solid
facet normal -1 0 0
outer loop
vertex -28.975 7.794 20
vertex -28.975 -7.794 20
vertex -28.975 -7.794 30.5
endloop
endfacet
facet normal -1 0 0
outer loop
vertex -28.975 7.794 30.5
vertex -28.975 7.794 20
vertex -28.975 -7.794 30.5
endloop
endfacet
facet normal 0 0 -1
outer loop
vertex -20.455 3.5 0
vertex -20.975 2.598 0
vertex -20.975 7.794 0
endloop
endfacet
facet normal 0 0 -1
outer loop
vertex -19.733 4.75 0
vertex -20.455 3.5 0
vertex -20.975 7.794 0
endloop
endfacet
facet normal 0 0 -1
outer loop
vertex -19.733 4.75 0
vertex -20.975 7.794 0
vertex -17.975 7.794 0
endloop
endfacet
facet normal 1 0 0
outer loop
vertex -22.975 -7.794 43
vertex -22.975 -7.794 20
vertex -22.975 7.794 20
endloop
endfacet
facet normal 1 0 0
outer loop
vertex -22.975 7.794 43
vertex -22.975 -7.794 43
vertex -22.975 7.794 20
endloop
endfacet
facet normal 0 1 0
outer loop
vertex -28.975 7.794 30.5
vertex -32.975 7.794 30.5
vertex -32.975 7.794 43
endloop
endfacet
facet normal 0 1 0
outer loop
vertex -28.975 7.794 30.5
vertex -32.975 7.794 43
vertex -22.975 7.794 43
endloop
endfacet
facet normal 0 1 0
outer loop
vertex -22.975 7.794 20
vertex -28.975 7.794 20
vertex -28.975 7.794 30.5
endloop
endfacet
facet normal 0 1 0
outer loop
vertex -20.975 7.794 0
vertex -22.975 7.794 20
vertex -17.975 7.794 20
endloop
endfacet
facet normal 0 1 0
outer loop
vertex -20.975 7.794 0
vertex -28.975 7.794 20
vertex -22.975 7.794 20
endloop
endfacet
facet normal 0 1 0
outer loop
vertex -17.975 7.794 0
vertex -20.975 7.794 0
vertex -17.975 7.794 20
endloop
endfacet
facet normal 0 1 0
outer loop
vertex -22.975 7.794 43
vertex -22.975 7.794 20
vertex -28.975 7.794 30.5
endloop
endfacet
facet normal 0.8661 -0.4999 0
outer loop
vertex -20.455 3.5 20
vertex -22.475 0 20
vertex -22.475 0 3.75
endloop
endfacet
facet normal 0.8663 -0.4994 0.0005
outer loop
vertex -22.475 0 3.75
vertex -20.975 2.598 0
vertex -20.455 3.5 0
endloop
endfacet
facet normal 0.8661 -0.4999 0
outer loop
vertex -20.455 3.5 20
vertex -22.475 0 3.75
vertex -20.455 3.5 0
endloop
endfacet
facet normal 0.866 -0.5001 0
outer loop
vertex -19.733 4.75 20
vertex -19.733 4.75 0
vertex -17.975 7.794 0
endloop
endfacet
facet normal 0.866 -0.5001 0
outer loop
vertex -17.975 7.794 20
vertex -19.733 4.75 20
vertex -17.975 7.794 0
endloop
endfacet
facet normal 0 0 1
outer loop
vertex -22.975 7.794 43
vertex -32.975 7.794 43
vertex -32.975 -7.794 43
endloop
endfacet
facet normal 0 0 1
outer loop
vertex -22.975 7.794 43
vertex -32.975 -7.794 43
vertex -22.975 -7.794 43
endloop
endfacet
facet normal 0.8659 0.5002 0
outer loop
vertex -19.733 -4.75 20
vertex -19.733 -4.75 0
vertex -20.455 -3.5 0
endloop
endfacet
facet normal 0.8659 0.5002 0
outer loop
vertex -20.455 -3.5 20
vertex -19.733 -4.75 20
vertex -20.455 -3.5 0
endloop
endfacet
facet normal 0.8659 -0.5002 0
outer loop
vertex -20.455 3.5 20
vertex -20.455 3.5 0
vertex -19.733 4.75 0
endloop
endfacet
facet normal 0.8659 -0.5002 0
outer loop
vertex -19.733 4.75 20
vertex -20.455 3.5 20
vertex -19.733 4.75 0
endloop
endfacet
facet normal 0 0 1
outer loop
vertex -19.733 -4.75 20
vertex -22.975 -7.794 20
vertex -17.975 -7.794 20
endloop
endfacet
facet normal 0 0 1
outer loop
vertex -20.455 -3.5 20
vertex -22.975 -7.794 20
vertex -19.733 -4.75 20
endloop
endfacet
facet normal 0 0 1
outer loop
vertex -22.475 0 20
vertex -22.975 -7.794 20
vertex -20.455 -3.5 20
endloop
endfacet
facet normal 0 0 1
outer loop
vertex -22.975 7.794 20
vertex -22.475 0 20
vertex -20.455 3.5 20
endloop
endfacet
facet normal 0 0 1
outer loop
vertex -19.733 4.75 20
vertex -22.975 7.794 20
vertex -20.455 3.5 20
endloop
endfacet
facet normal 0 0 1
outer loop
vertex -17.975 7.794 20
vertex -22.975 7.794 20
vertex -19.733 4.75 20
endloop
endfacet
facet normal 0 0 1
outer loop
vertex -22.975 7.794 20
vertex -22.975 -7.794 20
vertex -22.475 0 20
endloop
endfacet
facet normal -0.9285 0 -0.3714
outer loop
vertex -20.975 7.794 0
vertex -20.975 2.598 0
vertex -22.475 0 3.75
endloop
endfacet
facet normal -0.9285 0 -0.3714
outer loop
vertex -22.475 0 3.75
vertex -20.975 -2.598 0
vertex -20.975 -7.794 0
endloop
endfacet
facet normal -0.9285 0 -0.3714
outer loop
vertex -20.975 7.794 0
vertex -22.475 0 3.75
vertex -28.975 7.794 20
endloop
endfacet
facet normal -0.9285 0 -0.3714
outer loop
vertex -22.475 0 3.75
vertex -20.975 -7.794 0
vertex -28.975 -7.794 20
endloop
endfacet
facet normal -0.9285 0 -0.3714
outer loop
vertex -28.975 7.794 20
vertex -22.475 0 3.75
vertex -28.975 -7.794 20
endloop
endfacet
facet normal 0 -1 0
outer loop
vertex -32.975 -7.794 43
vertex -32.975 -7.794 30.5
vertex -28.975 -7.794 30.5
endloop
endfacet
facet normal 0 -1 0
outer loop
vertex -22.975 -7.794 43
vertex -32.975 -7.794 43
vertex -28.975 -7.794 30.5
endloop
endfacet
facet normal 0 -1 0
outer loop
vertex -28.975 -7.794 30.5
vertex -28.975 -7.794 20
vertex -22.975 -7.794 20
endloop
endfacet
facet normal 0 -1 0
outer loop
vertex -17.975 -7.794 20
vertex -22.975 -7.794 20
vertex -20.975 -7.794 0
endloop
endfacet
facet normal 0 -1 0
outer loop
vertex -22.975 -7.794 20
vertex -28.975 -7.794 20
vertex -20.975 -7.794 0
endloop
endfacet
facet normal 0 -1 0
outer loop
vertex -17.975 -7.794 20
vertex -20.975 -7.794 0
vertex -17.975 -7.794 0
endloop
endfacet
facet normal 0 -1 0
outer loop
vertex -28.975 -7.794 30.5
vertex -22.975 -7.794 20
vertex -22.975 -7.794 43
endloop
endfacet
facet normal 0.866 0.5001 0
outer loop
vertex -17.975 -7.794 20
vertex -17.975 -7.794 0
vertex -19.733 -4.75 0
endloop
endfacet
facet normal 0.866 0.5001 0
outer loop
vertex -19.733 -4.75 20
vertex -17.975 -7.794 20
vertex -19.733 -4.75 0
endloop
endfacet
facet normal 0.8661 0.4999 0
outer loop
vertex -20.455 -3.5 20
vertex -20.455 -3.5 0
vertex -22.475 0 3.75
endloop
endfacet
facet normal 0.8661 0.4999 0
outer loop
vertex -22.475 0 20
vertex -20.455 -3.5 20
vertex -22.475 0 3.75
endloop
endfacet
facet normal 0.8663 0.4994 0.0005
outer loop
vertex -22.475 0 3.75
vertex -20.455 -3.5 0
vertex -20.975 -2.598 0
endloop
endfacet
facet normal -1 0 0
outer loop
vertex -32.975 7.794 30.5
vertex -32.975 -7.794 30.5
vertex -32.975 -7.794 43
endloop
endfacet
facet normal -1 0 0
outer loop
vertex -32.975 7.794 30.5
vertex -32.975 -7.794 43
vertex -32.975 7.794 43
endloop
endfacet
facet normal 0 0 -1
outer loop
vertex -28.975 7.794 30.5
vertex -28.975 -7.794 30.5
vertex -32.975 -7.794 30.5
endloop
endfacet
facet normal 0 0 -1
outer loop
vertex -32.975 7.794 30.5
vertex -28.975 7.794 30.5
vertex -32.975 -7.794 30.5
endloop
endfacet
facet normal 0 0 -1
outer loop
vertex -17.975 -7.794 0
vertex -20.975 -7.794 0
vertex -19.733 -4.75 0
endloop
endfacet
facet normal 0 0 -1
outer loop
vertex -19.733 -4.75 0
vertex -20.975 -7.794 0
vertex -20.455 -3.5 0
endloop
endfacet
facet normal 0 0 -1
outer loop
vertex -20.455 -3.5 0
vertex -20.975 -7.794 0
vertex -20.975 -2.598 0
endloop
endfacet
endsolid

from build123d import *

# Parameters (mm, degrees)
F0_W     = 10
F0_H     = 15.588
F1_DEPTH = 20
F2_W     = 10
F2_H     = 15.588
F3_DEPTH = 23
F5_DEPTH = 15.589
F6_DEPTH = 15.589


with BuildPart() as f1:
    # F0 (on Top) → F1 (new body)
    with BuildSketch(Plane.XY):
        Polygon((-20.4545138283, 3.49999999), (-19.7328258911, 4.7500001644), (-17.9753717666, 7.794), (-22.9753717666, 7.794), (-22.9753717666, -7.794), (-17.9753717666, -7.794), (-19.732826028, -4.7499999273), (-20.4545138514, -3.49999995), (-22.4752397647, 0), align=None)
        with Locations((-27.9753717666, 0)):
            Rectangle(F0_W, F0_H)
    extrude(amount=F1_DEPTH)

    # F2 (on face) → F3 (join)
    with BuildSketch(Plane.XY.offset(20)):
        with Locations((-27.9753717666, 0)):
            Rectangle(F2_W, F2_H)
    extrude(amount=F3_DEPTH)

    # F4 (on face) → F5 (cut, through all)
    with BuildSketch(Plane.XZ.offset(7.794)):
        Polygon((-32.9753717666, 0), (-28.9753717666, 0), (-28.9753717666, 20), (-28.9753717666, 30.5), (-32.9753717666, 30.5), align=None)
    extrude(amount=-F5_DEPTH, mode=Mode.SUBTRACT)

    # F4 (on face) → F6 (cut, through all)
    with BuildSketch(Plane.XZ.offset(7.794)):
        Polygon((-28.9753717666, 0), (-20.9753717666, 0), (-28.9753717666, 20), align=None)
    extrude(amount=-F6_DEPTH, mode=Mode.SUBTRACT)


solid = f1.part
